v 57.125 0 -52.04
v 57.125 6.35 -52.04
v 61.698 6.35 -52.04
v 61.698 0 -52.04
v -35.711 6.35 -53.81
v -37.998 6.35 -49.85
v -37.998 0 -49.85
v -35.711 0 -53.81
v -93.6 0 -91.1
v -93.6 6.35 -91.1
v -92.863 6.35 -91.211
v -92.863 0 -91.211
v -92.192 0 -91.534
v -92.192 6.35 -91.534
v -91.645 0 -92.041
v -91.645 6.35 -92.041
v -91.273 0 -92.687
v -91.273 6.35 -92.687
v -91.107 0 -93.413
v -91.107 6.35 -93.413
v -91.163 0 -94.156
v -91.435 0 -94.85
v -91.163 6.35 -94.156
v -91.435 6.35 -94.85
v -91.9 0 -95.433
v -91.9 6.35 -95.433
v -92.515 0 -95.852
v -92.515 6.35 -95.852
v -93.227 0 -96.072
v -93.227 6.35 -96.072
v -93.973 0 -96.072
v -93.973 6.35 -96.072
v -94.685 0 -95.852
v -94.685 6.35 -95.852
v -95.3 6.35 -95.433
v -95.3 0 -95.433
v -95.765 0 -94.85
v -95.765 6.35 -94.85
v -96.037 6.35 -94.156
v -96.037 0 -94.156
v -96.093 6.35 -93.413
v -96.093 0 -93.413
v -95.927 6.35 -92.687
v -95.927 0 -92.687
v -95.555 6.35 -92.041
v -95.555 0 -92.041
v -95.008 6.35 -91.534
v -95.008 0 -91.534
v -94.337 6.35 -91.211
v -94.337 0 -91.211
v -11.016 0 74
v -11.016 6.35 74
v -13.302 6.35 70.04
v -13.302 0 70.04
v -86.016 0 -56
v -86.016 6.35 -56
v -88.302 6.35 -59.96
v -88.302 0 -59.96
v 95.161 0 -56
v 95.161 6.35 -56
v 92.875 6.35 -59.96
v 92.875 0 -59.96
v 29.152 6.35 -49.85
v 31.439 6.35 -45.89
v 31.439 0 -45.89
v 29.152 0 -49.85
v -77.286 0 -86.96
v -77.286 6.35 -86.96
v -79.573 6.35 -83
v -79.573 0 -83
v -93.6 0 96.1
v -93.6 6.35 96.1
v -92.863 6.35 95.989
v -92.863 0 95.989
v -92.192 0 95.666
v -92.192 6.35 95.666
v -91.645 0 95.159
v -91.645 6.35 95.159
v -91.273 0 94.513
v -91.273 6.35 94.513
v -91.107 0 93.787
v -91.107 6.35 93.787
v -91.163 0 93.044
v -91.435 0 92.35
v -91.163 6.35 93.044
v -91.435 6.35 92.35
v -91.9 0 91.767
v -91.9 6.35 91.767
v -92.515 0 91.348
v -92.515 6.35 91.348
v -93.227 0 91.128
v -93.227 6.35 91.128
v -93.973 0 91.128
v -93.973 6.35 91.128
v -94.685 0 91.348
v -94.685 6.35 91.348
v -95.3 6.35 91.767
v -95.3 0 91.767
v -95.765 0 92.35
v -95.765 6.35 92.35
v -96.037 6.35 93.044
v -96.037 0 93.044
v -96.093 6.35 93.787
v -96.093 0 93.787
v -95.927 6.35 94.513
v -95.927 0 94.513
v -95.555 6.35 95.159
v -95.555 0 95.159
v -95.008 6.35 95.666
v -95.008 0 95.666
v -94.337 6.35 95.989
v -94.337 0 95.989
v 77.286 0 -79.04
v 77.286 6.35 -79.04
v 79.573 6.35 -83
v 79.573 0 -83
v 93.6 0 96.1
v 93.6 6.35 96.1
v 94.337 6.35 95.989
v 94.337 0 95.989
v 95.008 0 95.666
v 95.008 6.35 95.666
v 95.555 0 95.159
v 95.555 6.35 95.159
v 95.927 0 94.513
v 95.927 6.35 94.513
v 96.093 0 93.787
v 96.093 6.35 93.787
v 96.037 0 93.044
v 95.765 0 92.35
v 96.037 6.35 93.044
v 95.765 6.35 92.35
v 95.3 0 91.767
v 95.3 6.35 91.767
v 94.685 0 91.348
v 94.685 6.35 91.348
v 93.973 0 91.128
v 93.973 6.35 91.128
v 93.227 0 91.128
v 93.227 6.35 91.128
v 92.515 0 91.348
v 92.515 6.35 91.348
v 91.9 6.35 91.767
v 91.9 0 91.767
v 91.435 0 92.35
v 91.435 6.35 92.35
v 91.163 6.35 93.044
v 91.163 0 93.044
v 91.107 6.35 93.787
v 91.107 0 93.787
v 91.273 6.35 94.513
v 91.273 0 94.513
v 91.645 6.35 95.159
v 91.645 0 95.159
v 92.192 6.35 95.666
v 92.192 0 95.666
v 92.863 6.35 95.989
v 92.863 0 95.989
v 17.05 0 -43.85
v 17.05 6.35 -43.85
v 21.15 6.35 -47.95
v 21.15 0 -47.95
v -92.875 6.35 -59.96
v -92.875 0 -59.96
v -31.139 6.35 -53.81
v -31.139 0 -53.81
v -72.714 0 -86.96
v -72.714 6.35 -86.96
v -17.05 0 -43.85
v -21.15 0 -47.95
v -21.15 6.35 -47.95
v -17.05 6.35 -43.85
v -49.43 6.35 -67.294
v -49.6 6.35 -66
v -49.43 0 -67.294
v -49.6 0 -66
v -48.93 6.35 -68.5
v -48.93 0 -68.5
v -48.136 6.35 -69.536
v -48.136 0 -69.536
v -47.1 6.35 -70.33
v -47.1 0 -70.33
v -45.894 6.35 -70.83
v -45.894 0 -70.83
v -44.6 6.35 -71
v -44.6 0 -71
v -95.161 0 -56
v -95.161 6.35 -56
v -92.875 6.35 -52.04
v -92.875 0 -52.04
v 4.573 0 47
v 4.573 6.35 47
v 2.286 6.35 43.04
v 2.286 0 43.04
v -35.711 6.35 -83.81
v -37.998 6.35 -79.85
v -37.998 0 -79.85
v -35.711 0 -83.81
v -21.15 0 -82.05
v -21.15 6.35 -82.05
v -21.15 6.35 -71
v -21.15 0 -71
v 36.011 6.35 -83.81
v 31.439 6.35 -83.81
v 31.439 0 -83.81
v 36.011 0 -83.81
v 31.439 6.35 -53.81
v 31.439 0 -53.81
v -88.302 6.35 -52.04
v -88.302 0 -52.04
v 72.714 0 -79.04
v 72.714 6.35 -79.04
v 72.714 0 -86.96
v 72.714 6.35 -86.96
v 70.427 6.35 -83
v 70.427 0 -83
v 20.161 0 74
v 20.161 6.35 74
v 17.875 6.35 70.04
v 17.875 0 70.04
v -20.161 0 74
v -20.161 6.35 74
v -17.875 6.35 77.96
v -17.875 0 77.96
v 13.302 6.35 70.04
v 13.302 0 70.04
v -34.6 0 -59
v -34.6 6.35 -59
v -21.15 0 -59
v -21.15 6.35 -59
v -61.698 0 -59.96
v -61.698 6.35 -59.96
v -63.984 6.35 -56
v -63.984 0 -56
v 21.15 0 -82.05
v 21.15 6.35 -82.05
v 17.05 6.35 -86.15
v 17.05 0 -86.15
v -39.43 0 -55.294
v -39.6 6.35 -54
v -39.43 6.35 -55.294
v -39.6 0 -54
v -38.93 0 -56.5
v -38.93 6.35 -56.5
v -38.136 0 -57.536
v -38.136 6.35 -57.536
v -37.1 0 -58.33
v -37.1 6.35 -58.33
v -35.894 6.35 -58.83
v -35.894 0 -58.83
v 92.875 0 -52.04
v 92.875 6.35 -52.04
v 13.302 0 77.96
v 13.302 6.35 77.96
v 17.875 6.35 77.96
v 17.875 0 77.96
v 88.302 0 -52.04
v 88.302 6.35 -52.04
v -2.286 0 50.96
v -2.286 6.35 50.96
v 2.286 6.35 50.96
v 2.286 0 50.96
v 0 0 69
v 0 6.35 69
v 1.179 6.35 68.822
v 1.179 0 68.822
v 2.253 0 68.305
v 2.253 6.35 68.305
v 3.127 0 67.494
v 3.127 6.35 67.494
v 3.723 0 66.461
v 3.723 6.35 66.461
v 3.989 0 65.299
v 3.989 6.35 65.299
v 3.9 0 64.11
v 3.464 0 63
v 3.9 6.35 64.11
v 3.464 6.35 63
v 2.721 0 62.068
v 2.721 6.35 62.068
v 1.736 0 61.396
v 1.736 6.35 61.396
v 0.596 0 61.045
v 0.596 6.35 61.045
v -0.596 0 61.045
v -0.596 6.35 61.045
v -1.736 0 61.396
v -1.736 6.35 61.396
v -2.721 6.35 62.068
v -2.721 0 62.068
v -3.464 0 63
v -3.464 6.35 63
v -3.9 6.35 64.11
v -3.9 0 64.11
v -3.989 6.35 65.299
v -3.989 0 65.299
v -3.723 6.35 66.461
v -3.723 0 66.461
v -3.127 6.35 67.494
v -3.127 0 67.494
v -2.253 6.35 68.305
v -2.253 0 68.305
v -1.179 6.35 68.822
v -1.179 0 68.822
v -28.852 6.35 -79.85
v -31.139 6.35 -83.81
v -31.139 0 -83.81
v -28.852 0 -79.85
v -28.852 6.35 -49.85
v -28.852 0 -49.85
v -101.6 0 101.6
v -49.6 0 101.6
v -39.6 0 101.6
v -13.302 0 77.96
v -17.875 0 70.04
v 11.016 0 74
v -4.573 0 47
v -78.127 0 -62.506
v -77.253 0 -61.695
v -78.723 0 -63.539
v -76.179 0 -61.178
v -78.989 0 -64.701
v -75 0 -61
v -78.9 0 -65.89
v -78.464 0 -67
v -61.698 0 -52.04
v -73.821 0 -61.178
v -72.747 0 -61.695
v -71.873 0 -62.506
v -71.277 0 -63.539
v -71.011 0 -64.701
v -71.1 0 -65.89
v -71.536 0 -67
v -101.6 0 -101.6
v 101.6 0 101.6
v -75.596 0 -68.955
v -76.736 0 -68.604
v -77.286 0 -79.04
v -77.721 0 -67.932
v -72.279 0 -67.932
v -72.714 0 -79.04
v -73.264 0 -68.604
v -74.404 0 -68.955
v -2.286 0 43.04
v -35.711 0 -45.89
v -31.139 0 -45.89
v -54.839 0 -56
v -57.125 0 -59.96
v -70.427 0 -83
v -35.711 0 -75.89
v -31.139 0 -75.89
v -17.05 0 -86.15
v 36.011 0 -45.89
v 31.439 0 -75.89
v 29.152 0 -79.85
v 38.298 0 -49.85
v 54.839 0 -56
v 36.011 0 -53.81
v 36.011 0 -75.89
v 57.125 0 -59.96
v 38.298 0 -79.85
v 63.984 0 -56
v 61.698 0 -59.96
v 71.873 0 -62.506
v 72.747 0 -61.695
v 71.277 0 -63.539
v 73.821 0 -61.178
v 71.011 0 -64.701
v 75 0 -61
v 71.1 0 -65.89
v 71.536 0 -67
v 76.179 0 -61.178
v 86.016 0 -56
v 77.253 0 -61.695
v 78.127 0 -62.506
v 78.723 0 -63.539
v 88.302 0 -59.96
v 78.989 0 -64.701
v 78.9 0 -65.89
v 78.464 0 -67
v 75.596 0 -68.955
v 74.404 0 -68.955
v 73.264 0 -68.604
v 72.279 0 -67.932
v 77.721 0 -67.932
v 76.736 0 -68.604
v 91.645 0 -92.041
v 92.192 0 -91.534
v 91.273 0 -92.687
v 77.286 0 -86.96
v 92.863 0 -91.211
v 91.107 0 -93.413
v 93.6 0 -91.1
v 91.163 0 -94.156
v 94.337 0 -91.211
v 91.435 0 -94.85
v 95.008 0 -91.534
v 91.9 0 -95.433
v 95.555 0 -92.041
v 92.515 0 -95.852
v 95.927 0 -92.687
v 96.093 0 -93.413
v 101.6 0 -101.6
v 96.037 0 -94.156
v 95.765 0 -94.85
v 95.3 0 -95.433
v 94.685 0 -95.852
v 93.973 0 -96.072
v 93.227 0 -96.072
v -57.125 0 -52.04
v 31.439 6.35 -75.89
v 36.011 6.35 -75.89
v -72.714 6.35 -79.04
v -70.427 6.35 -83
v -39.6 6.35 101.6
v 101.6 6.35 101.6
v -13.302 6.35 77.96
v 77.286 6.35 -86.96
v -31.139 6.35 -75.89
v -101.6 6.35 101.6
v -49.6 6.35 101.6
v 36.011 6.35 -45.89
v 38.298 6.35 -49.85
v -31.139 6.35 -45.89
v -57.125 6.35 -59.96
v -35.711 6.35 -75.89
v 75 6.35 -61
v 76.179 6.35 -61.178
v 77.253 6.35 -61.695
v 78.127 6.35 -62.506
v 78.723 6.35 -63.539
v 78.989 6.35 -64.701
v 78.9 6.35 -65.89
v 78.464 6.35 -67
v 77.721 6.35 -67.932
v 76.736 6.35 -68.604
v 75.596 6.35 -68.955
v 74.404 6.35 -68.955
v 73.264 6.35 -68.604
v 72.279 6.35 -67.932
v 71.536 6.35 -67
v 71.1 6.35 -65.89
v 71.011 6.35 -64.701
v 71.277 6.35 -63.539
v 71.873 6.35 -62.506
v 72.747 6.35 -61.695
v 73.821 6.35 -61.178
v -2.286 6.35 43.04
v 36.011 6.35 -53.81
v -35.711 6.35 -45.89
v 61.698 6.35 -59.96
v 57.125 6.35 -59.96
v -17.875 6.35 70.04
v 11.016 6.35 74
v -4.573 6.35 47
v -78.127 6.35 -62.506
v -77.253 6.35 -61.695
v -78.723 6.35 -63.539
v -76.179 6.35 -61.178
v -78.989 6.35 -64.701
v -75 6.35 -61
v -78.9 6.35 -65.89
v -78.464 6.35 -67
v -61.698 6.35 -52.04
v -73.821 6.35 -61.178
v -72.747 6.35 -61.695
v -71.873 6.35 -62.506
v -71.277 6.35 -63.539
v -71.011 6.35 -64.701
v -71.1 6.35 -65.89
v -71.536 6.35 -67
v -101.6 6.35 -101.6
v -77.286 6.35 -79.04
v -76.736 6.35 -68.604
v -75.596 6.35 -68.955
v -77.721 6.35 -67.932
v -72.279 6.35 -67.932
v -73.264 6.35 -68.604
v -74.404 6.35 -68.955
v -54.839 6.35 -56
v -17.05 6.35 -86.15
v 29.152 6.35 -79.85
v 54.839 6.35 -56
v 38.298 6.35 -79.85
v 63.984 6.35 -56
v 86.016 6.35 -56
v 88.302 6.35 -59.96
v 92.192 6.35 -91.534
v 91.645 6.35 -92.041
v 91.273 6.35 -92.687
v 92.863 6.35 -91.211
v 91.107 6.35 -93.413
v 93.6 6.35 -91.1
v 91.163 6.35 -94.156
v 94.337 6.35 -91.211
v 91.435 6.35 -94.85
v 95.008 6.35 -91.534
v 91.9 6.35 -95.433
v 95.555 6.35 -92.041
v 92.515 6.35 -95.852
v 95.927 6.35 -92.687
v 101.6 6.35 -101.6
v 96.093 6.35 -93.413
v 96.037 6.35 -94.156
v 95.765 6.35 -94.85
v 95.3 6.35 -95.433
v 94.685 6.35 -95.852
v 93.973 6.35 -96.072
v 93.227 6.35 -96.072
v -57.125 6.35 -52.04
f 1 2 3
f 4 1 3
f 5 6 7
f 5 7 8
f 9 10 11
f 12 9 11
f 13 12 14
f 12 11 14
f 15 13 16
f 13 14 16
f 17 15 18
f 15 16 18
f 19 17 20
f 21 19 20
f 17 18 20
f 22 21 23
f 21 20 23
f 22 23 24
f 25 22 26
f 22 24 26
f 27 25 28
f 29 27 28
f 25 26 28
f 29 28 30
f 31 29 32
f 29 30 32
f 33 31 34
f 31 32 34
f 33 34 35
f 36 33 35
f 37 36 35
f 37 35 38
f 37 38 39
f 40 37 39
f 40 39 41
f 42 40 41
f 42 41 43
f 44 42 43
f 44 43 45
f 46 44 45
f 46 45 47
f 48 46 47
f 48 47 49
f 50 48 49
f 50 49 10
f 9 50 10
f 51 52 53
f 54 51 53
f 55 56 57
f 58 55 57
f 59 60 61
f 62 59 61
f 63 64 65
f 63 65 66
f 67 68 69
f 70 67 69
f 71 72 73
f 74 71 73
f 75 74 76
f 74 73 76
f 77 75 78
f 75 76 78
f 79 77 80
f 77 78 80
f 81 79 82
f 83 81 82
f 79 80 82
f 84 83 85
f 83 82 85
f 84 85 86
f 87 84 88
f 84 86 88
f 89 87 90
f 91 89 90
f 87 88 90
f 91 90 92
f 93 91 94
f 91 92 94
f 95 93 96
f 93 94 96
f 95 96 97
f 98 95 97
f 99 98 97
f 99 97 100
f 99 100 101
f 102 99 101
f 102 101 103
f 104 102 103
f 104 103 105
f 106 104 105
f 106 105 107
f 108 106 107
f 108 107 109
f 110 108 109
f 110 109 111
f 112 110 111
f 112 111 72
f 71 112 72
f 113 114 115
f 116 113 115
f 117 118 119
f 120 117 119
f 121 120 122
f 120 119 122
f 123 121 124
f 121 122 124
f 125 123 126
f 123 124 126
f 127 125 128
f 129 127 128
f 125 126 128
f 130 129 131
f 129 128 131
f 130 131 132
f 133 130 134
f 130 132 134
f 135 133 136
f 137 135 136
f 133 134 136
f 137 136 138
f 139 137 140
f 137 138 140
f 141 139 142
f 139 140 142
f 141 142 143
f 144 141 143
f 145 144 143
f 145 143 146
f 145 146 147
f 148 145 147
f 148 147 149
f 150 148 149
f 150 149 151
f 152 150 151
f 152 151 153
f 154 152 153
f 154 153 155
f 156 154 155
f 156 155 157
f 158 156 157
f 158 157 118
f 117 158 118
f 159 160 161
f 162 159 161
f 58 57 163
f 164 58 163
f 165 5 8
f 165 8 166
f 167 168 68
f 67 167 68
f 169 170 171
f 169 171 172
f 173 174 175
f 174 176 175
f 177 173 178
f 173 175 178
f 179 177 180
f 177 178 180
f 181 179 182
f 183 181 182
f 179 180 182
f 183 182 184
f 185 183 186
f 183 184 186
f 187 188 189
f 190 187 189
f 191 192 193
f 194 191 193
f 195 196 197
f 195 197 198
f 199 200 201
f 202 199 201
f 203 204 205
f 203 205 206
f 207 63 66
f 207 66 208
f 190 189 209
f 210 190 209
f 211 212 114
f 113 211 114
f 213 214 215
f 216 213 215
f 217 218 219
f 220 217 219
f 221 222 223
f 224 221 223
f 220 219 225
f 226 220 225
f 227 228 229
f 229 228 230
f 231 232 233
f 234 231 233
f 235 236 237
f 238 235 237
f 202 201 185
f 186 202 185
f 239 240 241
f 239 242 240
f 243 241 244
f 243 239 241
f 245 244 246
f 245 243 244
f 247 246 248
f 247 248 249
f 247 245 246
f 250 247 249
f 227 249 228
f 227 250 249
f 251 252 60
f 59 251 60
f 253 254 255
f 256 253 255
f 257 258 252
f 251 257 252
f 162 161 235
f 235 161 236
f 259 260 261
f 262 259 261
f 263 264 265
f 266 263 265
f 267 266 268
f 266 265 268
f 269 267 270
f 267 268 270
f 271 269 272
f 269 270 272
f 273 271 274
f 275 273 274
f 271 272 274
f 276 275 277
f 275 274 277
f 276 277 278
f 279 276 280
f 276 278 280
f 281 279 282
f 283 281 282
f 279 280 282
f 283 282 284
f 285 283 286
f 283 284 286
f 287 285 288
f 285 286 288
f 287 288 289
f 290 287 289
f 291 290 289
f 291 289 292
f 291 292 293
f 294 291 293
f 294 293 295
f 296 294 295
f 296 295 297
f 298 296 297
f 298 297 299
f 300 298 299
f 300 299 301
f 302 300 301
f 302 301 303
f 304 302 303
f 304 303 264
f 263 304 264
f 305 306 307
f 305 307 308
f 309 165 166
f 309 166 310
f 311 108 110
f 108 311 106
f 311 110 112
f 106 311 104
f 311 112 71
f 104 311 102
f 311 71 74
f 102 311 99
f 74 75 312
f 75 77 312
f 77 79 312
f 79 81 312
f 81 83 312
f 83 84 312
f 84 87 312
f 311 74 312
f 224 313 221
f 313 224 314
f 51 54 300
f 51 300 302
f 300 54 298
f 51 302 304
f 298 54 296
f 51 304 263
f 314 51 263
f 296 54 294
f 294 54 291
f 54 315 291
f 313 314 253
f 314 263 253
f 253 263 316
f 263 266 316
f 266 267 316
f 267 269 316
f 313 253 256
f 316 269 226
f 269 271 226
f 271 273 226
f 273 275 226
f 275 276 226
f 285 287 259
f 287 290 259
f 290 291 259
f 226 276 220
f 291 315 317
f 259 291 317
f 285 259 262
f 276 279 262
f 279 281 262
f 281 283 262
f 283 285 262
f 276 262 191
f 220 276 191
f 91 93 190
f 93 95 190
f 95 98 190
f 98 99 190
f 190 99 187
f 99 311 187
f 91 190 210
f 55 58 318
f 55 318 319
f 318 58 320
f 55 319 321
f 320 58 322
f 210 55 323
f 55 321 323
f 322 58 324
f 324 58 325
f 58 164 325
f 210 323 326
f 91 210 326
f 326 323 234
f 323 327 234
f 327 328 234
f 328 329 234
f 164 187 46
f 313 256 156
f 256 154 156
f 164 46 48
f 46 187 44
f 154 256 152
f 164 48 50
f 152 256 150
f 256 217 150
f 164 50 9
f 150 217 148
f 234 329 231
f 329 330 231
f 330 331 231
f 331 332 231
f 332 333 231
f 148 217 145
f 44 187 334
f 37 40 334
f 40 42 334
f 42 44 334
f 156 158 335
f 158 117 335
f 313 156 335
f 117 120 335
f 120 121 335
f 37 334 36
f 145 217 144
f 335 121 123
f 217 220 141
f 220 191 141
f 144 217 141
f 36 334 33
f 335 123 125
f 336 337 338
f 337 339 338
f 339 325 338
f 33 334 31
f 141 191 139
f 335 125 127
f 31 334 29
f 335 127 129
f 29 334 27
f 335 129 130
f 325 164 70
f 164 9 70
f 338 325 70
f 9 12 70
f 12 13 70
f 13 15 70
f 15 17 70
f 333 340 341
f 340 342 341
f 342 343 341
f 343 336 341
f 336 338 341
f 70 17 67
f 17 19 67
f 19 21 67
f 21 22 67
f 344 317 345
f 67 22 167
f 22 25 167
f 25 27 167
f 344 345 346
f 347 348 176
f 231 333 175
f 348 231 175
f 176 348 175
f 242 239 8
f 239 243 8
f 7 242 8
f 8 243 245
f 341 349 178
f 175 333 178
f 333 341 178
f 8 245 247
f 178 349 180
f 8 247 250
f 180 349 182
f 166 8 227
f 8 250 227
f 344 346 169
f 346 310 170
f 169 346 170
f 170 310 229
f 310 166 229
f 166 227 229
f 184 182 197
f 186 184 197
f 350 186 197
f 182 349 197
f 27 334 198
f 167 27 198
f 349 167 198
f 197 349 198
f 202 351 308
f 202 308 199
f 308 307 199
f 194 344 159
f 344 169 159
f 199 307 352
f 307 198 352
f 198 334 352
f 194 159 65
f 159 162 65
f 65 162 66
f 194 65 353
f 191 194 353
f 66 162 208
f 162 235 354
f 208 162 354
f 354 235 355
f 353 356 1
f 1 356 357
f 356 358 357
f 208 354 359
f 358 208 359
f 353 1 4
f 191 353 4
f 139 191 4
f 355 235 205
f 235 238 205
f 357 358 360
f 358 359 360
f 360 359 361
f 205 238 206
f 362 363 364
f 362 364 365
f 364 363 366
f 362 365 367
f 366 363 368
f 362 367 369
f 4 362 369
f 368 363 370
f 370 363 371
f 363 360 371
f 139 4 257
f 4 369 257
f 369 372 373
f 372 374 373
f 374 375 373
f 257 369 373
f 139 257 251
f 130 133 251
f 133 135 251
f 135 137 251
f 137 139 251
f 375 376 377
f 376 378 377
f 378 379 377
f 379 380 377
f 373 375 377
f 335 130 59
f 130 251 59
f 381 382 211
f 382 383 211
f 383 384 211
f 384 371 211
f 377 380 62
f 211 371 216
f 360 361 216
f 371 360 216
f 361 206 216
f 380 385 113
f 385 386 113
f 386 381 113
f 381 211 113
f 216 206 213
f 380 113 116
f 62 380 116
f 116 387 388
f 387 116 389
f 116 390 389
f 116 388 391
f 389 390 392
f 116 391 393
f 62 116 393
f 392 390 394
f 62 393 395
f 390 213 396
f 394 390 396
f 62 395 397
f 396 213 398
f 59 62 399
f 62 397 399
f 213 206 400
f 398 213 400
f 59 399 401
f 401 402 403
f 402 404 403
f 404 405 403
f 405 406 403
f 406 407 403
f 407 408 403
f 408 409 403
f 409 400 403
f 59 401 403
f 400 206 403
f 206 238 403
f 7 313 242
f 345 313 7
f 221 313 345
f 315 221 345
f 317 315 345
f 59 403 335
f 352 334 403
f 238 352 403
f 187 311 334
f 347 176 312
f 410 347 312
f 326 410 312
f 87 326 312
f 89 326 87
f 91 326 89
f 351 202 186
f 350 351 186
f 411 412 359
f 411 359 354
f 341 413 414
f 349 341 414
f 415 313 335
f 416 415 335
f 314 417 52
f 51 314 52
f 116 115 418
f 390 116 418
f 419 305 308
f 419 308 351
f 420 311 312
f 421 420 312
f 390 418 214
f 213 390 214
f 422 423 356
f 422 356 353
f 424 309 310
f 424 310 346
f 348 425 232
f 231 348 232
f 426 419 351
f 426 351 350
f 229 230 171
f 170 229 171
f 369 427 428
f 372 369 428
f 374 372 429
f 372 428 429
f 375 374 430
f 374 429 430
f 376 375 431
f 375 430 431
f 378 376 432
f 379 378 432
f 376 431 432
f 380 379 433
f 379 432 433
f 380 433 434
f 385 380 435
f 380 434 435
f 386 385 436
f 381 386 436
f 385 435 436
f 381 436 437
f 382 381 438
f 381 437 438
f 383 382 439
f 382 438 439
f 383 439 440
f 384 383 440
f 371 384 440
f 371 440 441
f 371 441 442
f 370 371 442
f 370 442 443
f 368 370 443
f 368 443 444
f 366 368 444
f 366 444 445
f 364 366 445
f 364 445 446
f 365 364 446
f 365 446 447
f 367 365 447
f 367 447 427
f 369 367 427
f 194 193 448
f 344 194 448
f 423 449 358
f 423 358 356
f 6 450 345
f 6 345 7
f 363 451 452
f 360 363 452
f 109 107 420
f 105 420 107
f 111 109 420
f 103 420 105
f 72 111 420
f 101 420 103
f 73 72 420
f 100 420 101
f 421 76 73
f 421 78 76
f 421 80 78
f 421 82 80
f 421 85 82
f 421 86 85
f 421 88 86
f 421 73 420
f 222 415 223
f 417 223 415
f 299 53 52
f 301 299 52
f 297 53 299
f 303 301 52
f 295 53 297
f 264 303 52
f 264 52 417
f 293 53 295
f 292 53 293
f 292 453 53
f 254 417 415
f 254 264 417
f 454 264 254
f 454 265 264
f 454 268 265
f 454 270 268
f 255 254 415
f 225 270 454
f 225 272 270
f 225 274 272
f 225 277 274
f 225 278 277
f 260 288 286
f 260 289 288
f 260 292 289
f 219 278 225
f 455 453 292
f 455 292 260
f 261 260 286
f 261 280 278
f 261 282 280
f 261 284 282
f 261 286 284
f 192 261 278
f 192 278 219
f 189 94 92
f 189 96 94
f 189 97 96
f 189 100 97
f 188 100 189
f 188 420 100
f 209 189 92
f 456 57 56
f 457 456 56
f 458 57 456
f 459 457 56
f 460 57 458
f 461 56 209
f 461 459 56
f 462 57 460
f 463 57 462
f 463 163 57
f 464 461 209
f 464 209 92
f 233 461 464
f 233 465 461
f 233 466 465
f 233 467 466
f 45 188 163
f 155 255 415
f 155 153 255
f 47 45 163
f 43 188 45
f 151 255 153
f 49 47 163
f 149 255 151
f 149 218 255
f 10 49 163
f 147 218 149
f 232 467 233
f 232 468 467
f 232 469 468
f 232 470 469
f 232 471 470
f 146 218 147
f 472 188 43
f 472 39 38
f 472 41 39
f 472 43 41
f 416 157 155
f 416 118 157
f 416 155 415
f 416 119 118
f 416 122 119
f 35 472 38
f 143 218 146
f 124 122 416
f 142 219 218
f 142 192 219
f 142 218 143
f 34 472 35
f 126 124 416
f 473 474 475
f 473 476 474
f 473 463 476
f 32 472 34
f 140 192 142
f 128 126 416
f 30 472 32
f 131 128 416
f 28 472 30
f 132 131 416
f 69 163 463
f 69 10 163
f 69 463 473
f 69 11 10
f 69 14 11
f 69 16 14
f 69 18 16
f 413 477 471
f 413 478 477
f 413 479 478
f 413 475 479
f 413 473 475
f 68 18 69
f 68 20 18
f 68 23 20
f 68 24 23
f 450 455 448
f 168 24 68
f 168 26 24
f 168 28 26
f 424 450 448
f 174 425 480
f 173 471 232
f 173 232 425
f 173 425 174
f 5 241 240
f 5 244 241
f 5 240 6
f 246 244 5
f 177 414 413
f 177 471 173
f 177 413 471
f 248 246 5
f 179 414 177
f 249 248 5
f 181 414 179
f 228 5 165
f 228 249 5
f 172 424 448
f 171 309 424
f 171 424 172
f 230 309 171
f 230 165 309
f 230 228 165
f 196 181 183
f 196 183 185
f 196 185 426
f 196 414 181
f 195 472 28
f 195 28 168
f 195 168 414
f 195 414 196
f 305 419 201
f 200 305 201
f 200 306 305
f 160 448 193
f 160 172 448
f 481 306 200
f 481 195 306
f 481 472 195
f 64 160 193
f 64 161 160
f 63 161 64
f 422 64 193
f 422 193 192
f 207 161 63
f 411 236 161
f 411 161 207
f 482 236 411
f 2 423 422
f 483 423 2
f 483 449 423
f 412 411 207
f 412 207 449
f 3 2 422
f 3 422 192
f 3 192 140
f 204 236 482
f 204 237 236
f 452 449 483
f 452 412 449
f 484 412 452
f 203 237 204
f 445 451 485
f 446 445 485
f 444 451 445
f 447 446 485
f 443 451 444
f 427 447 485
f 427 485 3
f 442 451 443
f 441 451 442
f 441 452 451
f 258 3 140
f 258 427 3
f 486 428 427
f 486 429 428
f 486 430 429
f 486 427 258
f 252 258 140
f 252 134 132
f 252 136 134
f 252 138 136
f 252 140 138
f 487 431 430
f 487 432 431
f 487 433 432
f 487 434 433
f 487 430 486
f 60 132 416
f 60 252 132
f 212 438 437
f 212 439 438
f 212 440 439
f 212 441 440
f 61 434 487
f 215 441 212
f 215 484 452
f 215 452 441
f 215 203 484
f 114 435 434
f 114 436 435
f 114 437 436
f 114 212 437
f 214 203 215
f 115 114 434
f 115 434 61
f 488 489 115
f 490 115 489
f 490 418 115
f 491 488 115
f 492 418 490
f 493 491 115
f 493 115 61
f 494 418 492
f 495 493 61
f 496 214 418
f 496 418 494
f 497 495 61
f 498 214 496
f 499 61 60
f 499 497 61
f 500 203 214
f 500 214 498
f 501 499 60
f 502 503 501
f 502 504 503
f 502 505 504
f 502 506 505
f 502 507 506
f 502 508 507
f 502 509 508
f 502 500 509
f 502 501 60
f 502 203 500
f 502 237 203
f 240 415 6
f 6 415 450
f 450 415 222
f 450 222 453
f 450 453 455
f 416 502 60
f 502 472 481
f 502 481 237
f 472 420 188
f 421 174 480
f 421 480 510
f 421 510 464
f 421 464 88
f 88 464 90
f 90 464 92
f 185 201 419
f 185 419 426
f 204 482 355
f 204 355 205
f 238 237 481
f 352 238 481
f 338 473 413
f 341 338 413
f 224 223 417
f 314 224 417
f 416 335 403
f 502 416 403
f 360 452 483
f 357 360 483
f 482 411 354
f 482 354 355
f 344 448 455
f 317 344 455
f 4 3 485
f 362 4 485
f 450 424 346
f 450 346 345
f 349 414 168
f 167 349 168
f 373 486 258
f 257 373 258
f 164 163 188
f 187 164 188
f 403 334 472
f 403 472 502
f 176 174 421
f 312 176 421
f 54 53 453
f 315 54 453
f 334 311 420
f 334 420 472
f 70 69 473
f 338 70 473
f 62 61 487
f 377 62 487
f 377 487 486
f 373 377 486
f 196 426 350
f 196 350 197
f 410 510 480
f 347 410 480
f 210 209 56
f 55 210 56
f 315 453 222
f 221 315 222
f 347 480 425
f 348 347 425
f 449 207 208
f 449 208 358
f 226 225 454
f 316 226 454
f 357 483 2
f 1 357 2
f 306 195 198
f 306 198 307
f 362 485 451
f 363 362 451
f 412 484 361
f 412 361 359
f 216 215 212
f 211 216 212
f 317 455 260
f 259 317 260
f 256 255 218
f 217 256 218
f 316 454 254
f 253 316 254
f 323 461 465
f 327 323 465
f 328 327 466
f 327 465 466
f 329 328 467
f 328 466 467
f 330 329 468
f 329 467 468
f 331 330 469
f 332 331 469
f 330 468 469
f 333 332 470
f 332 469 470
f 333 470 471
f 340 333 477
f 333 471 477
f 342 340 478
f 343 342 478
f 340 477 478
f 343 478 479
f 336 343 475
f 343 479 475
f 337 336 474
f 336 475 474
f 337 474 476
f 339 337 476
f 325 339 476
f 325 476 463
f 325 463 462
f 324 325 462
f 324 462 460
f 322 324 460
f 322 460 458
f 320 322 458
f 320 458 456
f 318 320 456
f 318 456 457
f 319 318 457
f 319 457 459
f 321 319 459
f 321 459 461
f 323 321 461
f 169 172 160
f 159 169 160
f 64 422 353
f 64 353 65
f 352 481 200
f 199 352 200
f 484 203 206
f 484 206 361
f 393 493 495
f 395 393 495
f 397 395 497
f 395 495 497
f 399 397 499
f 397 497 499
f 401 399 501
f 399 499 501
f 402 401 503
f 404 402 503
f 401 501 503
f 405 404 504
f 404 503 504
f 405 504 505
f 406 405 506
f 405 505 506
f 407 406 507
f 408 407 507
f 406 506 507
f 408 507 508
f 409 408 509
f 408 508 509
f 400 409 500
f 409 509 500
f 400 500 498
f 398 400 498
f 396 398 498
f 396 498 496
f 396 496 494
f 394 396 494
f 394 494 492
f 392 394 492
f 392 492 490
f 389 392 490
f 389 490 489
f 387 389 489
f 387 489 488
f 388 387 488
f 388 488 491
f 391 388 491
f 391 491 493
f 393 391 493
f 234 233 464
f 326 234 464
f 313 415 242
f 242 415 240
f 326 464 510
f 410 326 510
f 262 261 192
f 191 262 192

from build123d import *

# Parameters (mm, degrees)
ESQUISSE1_W              = 203.2
ESQUISSE1_H              = 203.2
BOSS_EXTRU_1_DEPTH       = 6.35
ESQUISSE2_R              = 4
ENL_V_MAT_EXTRU_1_DEPTH  = 144.824345992
ENL_V_MAT_EXTRU_2_DEPTH  = 144.824345992
ENL_V_MAT_EXTRU_3_DEPTH  = 144.824345992
CONG_1_R                 = 5
ENL_V_MAT_EXTRU_5_DEPTH  = 144.824345992
ENL_V_MAT_EXTRU_6_DEPTH  = 144.824345992
ENL_V_MAT_EXTRU_7_DEPTH  = 144.824345992
ENL_V_MAT_EXTRU_8_DEPTH  = 144.824345992
ENL_V_MAT_EXTRU_9_DEPTH  = 144.824345992
ESQUISSE11_R             = 2.5
ENL_V_MAT_EXTRU_10_DEPTH = 144.824345992


with BuildPart() as part:
    # Esquisse1 → Boss.-Extru.1 (new body)
    with BuildSketch(Plane(origin=(0, 0, 0), x_dir=(1, 0, 0), z_dir=(0, 1, 0))):
        Rectangle(ESQUISSE1_W, ESQUISSE1_H)
    extrude(amount=BOSS_EXTRU_1_DEPTH)

    # Esquisse2 → Enlèv. mat.-Extru.1 (cut, through all)
    with BuildSketch(Plane(origin=(0, 6.35, 0), x_dir=(1, 0, 0), z_dir=(0, 1, 0))):
        with Locations(Location((-75, 65, 0), (0, 0, 270))):
            Circle(ESQUISSE2_R)
        with Locations(Location((75, 65, 0), (0, 0, 270))):
            Circle(ESQUISSE2_R)
        with Locations(Location((0, -65, 0), (0, 0, 270))):
            Circle(ESQUISSE2_R)
    extrude(amount=-ENL_V_MAT_EXTRU_1_DEPTH, mode=Mode.SUBTRACT)

    # Esquisse3 → Enlèv. mat.-Extru.2 (cut, through all)
    with BuildSketch(Plane(origin=(0, 6.35, 0), x_dir=(1, 0, 0), z_dir=(0, 1, 0))):
        Polygon((-17.05, 86.15), (-21.15, 82.05), (-21.15, 47.95), (-17.05, 43.85), (17.05, 43.85), (21.15, 47.95), (21.15, 82.05), (17.05, 86.15), align=None)
    extrude(amount=-ENL_V_MAT_EXTRU_2_DEPTH, mode=Mode.SUBTRACT)

    # Esquisse4 → Enlèv. mat.-Extru.3 (cut, through all)
    with BuildSketch(Plane(origin=(0, 6.35, 0), x_dir=(1, 0, 0), z_dir=(0, 1, 0))):
        Polygon((-49.6, -101.6), (-39.6, -101.6), (-39.6, 59), (-21.15, 59), (-21.15, 71), (-49.6, 71), align=None)
    extrude(amount=-ENL_V_MAT_EXTRU_3_DEPTH, mode=Mode.SUBTRACT)

    # Congé1
    cong_1_edges = [part.edges().sort_by_distance(p)[0] for p in [
        (-49.6, 3.175, -71),
        (-39.6, 3.175, -59),
    ]]
    fillet(cong_1_edges, radius=CONG_1_R)

    # Esquisse5 → Enlèv. mat.-Extru.5 (cut, through all)
    with BuildSketch(Plane(origin=(0, 6.35, 0), x_dir=(1, 0, 0), z_dir=(0, 1, 0))):
        Polygon((-28.852385868, 49.85), (-31.138692934, 45.89), (-35.711307066, 45.89), (-37.997614132, 49.85), (-35.711307066, 53.81), (-31.138692934, 53.81), align=None)
    extrude(amount=-ENL_V_MAT_EXTRU_5_DEPTH, mode=Mode.SUBTRACT)

    # Esquisse7 → Enlèv. mat.-Extru.6 (cut, through all)
    with BuildSketch(Plane(origin=(0, 6.35, 0), x_dir=(1, 0, 0), z_dir=(0, 1, 0))):
        Polygon((-31.138692934, 75.89), (-35.711307066, 75.89), (-37.997614132, 79.85), (-35.711307066, 83.81), (-31.138692934, 83.81), (-28.852385868, 79.85), align=None)
    extrude(amount=-ENL_V_MAT_EXTRU_6_DEPTH, mode=Mode.SUBTRACT)

    # Esquisse8 → Enlèv. mat.-Extru.7 (cut, through all)
    with BuildSketch(Plane(origin=(0, 6.35, 0), x_dir=(1, 0, 0), z_dir=(0, 1, 0))):
        Polygon((36.011307066, 45.89), (31.438692934, 45.89), (29.152385868, 49.85), (31.438692934, 53.81), (36.011307066, 53.81), (38.297614132, 49.85), align=None)
    extrude(amount=-ENL_V_MAT_EXTRU_7_DEPTH, mode=Mode.SUBTRACT)

    # Esquisse9 → Enlèv. mat.-Extru.8 (cut, through all)
    with BuildSketch(Plane(origin=(0, 6.35, 0), x_dir=(1, 0, 0), z_dir=(0, 1, 0))):
        Polygon((36.011307066, 75.89), (31.438692934, 75.89), (29.152385868, 79.85), (31.438692934, 83.81), (36.011307066, 83.81), (38.297614132, 79.85), align=None)
    extrude(amount=-ENL_V_MAT_EXTRU_8_DEPTH, mode=Mode.SUBTRACT)

    # Esquisse10 → Enlèv. mat.-Extru.9 (cut, through all)
    with BuildSketch(Plane(origin=(0, 6.35, 0), x_dir=(1, 0, 0), z_dir=(0, 1, 0))):
        Polygon((20.1610714, -74), (17.874764334, -70.04), (13.302150202, -70.04), (11.015843136, -74), (13.302150202, -77.96), (17.874764334, -77.96), align=None)
        Polygon((-20.1610714, -74), (-17.874764334, -77.96), (-13.302150202, -77.96), (-11.015843136, -74), (-13.302150202, -70.04), (-17.874764334, -70.04), align=None)
        Polygon((-4.572614132, -47), (-2.286307066, -50.96), (2.286307066, -50.96), (4.572614132, -47), (2.286307066, -43.04), (-2.286307066, -43.04), align=None)
        Polygon((-63.984156864, 56), (-61.697849798, 52.04), (-57.125235666, 52.04), (-54.8389286, 56), (-57.125235666, 59.96), (-61.697849798, 59.96), align=None)
        Polygon((-95.1610714, 56), (-92.874764334, 52.04), (-88.302150202, 52.04), (-86.015843136, 56), (-88.302150202, 59.96), (-92.874764334, 59.96), align=None)
        Polygon((-79.572614132, 83), (-77.286307066, 79.04), (-72.713692934, 79.04), (-70.427385868, 83), (-72.713692934, 86.96), (-77.286307066, 86.96), align=None)
        Polygon((54.8389286, 56), (57.125235666, 52.04), (61.697849798, 52.04), (63.984156864, 56), (61.697849798, 59.96), (57.125235666, 59.96), align=None)
        Polygon((95.1610714, 56), (92.874764334, 59.96), (88.302150202, 59.96), (86.015843136, 56), (88.302150202, 52.04), (92.874764334, 52.04), align=None)
        Polygon((70.427385868, 83), (72.713692934, 79.04), (77.286307066, 79.04), (79.572614132, 83), (77.286307066, 86.96), (72.713692934, 86.96), align=None)
    extrude(amount=-ENL_V_MAT_EXTRU_9_DEPTH, mode=Mode.SUBTRACT)

    # Esquisse11 → Enlèv. mat.-Extru.10 (cut, through all)
    with BuildSketch(Plane(origin=(0, 6.35, 0), x_dir=(1, 0, 0), z_dir=(0, 1, 0))):
        with Locations(Location((93.6, 93.6, 0), (0, 0, 270))):
            Circle(ESQUISSE11_R)
        with Locations(Location((-93.6, 93.6, 0), (0, 0, 270))):
            Circle(ESQUISSE11_R)
        with Locations(Location((-93.6, -93.6, 0), (0, 0, 270))):
            Circle(ESQUISSE11_R)
        with Locations(Location((93.6, -93.6, 0), (0, 0, 270))):
            Circle(ESQUISSE11_R)
    extrude(amount=-ENL_V_MAT_EXTRU_10_DEPTH, mode=Mode.SUBTRACT)


solid = part.part
